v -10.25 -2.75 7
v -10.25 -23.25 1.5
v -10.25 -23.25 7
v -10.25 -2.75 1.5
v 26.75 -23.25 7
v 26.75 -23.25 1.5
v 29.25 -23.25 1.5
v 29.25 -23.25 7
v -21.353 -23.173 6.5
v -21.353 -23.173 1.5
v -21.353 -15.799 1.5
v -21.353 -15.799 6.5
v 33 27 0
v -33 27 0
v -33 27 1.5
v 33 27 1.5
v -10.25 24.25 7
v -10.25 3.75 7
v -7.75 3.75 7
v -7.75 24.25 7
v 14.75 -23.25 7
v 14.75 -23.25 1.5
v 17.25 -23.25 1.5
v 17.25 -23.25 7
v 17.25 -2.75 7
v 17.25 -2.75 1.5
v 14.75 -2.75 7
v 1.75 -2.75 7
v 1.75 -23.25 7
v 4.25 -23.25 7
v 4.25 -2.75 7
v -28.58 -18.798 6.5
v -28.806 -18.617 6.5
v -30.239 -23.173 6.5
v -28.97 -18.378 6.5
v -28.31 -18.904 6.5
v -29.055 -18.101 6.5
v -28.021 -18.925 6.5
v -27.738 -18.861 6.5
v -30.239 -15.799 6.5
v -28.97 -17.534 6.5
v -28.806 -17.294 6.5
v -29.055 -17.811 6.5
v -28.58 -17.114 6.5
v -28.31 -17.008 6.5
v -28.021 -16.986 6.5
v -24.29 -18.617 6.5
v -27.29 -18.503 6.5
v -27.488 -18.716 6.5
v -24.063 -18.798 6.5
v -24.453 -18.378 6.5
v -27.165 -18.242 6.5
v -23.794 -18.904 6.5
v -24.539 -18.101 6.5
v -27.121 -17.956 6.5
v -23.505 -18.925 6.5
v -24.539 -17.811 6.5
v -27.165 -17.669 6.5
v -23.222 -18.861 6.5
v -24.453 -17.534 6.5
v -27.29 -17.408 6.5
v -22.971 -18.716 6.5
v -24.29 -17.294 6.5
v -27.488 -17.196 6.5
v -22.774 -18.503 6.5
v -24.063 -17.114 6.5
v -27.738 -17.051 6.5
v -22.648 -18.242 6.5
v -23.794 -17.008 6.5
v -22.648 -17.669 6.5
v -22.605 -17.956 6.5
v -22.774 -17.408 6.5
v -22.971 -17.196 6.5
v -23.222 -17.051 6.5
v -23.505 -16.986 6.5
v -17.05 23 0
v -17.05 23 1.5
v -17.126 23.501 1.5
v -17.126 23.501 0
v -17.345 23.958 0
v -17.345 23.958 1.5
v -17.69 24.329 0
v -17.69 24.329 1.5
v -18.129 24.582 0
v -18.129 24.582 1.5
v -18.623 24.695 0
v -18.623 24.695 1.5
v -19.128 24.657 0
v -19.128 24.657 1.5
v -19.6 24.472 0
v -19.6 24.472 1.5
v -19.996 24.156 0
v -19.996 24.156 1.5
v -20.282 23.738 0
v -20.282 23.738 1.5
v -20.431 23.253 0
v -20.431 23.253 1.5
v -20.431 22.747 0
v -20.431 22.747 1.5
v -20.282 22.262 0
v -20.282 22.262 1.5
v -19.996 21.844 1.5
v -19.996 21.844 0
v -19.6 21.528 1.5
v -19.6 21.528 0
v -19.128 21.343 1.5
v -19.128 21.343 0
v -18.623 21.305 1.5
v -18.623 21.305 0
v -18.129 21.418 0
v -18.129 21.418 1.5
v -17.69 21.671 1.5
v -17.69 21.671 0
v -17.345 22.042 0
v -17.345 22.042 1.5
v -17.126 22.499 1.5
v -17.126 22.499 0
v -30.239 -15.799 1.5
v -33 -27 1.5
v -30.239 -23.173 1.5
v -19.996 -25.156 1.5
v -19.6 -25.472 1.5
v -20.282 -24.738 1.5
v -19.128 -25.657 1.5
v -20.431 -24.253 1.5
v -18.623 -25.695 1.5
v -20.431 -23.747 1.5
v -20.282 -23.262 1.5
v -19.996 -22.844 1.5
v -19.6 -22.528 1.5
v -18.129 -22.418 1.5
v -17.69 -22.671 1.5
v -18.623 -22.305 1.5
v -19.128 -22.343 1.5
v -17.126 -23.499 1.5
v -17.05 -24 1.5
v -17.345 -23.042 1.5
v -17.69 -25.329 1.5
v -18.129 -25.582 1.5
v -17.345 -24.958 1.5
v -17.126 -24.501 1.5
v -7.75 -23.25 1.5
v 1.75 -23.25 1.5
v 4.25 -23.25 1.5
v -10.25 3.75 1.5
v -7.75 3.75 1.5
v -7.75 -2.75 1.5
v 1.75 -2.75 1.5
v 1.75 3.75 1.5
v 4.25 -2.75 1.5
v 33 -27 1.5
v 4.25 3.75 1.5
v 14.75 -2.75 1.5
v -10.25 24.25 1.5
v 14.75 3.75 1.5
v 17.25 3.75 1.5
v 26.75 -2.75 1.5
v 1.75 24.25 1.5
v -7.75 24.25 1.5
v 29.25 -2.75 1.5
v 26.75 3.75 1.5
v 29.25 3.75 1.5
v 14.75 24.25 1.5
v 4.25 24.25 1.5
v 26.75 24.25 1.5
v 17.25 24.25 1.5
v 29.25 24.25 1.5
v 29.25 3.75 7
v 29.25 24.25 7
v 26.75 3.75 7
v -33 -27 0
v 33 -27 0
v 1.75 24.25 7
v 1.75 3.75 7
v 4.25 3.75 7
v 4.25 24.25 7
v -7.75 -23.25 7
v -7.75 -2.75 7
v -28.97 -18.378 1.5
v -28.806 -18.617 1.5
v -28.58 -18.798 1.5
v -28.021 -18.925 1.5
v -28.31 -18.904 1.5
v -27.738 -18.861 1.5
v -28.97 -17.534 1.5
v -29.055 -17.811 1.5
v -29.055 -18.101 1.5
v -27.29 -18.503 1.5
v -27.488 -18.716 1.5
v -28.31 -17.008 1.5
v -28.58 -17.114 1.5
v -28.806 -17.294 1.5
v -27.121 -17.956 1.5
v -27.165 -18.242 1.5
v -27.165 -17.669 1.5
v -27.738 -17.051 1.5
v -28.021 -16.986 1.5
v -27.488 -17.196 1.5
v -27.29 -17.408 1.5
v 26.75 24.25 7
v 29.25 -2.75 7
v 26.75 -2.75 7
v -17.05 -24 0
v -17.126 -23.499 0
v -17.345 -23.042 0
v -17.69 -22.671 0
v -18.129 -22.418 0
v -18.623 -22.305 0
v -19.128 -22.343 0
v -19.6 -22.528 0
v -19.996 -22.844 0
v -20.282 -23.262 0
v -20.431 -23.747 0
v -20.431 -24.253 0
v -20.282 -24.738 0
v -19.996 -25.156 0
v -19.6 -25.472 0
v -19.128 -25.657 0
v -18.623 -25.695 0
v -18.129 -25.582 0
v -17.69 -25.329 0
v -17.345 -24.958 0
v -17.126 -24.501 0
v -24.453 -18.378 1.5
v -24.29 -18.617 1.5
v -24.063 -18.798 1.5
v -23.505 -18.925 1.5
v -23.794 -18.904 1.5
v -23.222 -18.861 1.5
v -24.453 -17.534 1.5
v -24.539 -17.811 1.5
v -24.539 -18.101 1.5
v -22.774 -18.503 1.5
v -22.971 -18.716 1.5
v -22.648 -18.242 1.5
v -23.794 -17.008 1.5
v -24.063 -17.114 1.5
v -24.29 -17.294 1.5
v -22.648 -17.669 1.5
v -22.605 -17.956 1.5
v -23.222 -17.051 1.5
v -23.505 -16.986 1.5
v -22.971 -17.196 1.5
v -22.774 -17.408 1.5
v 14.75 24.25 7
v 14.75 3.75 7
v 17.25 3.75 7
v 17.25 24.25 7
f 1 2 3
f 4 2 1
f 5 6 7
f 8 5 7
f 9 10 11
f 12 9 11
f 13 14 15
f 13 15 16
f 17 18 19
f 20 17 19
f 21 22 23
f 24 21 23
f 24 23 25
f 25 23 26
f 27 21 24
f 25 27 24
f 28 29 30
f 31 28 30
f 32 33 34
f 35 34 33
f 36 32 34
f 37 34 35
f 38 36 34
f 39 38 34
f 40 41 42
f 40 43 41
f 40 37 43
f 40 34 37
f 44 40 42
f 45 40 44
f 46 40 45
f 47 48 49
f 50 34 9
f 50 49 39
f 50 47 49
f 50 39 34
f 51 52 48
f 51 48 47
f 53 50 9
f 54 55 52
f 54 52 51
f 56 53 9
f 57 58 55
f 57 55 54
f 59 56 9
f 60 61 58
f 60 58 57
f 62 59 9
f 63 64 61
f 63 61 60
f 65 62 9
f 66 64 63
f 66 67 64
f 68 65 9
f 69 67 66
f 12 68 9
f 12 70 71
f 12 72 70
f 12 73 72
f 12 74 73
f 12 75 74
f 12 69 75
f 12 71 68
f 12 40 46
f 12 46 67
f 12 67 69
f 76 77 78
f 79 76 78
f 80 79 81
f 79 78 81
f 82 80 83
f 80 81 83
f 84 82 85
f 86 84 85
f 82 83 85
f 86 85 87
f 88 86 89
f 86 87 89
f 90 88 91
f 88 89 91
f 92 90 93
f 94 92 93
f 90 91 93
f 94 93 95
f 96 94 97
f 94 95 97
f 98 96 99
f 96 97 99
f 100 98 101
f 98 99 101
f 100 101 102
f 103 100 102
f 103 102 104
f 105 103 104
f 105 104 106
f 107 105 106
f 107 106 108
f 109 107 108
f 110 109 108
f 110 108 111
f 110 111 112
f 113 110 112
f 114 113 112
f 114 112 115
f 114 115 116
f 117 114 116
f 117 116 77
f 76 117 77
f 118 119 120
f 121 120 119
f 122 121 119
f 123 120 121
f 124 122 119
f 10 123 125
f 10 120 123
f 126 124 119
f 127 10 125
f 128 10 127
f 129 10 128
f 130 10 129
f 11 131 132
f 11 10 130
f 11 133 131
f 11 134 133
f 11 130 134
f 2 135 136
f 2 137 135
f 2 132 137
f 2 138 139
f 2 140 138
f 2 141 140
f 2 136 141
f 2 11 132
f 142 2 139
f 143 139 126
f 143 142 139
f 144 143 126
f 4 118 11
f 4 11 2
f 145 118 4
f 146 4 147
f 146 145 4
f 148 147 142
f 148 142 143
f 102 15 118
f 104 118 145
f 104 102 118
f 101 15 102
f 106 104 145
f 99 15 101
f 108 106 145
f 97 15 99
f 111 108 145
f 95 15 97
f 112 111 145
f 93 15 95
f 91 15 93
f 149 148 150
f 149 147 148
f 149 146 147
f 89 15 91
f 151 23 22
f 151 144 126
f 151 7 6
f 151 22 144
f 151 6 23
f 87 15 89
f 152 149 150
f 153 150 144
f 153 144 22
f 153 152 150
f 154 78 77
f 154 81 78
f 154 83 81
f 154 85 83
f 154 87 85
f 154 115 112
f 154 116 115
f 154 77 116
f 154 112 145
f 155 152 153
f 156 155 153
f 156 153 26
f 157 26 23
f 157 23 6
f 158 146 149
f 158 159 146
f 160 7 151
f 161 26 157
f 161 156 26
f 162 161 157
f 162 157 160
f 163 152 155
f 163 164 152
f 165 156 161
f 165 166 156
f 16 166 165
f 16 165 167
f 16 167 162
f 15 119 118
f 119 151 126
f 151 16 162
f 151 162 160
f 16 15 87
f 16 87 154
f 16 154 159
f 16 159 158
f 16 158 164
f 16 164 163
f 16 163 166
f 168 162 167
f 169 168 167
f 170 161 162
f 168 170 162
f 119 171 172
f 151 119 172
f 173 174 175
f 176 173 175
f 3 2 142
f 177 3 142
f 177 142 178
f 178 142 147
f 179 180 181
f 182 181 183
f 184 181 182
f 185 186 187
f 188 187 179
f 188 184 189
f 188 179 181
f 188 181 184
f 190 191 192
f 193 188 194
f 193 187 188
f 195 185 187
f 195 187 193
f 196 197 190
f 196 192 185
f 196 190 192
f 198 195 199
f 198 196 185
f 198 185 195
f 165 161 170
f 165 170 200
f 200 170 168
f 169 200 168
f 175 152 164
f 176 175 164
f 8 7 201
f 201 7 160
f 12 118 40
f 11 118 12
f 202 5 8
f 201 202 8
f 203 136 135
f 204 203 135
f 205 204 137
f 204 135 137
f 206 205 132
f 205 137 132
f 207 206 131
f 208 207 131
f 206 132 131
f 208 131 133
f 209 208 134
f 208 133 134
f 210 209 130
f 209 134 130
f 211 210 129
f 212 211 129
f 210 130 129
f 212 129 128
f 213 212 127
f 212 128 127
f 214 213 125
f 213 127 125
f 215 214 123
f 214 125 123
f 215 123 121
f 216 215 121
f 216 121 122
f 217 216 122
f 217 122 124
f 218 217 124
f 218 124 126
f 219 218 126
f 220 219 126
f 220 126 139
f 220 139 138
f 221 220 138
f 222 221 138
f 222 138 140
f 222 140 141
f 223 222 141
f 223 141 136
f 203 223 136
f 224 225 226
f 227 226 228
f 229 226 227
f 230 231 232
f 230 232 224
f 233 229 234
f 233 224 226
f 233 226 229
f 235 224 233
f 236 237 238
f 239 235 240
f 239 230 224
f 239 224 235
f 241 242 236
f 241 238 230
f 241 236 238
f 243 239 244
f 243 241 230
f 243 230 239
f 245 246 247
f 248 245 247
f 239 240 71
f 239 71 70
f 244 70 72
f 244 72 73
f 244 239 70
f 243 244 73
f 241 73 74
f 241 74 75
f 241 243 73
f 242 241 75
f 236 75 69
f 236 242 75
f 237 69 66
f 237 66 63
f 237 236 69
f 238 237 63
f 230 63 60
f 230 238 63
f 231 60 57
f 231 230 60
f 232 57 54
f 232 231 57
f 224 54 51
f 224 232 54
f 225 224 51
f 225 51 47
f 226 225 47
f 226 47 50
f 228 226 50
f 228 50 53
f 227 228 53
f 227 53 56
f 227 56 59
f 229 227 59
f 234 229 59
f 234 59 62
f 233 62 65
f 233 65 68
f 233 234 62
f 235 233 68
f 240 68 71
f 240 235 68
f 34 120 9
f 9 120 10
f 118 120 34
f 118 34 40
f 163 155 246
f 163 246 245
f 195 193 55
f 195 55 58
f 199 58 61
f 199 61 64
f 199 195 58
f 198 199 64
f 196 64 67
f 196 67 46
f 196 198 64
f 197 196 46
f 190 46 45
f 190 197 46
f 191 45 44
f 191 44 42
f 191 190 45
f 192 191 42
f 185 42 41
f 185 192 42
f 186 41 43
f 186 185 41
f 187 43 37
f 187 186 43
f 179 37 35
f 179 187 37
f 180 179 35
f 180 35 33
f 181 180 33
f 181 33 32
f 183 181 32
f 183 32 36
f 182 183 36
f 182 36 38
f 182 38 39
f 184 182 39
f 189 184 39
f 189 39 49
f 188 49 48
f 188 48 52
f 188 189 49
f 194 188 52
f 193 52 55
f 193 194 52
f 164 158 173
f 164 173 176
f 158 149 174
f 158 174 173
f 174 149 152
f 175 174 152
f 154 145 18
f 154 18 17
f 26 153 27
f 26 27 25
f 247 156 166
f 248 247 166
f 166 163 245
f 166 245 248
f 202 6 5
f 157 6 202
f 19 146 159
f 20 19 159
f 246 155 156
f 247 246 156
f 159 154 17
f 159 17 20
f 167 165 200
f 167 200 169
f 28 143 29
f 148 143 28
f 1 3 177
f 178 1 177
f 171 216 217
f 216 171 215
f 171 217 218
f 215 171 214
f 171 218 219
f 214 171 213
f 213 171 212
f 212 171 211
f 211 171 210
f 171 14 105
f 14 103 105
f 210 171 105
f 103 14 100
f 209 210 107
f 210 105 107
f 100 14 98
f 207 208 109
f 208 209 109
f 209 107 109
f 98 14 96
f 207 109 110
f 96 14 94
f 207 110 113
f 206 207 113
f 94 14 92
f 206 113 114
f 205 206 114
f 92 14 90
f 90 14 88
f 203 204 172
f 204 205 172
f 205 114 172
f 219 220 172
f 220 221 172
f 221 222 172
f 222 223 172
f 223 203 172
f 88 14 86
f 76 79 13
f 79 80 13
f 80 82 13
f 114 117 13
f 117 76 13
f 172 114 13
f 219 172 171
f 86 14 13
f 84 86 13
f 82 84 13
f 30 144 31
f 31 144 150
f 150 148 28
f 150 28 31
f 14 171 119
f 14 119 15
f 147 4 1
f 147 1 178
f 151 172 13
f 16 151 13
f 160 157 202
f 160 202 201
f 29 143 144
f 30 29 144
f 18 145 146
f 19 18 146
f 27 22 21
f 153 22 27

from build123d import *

# Parameters (mm, degrees)
SKETCH075_W                     = 66
SKETCH075_H                     = 54
PAD041_DEPTH                    = 1.5
SKETCH076_W                     = 2.5
SKETCH076_H                     = 20.5
PAD042_DEPTH                    = 7
SKETCH076_LINEARPATTERN002_2_W  = 2.5
SKETCH076_LINEARPATTERN002_2_H  = 20.5
PAD042_LINEARPATTERN002_2_DEPTH = 7
LINEARPATTERN003_COUNT          = 2
LINEARPATTERN003_PITCH          = 27
SKETCH077_W                     = 8.886057
SKETCH077_H                     = 7.374495
SKETCH077_R                     = 0.972187
PAD043_DEPTH                    = 5
SKETCH078_R                     = 1.7
HOLE_DEPTH                      = 25


with BuildPart() as part:
    # Sketch075 → Pad041 (new body)
    with BuildSketch(Plane.XY):
        Rectangle(SKETCH075_W, SKETCH075_H)
    extrude(amount=PAD041_DEPTH)

    # Sketch076 → Pad042 (join)
    with BuildSketch(Plane(origin=(-3, -13, 0), x_dir=(1, 0, 0), z_dir=(0, 0, 1))):
        with Locations((-6, 0)):
            Rectangle(SKETCH076_W, SKETCH076_H)
        with Locations((6, 0)):
            Rectangle(SKETCH076_W, SKETCH076_H)
    pad042 = extrude(amount=PAD042_DEPTH)

    # Sketch076 LinearPattern002 2 → Pad042 LinearPattern002 2 (add)
    with BuildSketch(Plane(origin=(22, -13, 0), x_dir=(1, 0, 0), z_dir=(0, 0, 1))):
        with Locations((-6, 0)):
            Rectangle(SKETCH076_LINEARPATTERN002_2_W, SKETCH076_LINEARPATTERN002_2_H)
        with Locations((6, 0)):
            Rectangle(SKETCH076_LINEARPATTERN002_2_W, SKETCH076_LINEARPATTERN002_2_H)
    pad042_linearpattern002_2 = extrude(amount=PAD042_LINEARPATTERN002_2_DEPTH)

    # LinearPattern003: Pad042, Pad042 LinearPattern002 2 ×2
    with Locations(*[(0, i * LINEARPATTERN003_PITCH, 0) for i in range(1, LINEARPATTERN003_COUNT)]):
        add(pad042)
        add(pad042_linearpattern002_2)

    # Sketch077 → Pad043 (join)
    with BuildSketch(Plane.XY.offset(1.5)):
        with Locations((-25.795806, -19.485859)):
            Rectangle(SKETCH077_W, SKETCH077_H)
        with Locations((-28.09366, -17.955694)):
            Circle(SKETCH077_R, mode=Mode.SUBTRACT)
        with Locations((-23.577271, -17.955694)):
            Circle(SKETCH077_R, mode=Mode.SUBTRACT)
    extrude(amount=PAD043_DEPTH)

    # Sketch078 → Hole (cut)
    with BuildSketch(Plane.XY.offset(1.5)):
        with Locations((-18.75, 23)):
            Circle(SKETCH078_R)
        with Locations((-18.75, -24)):
            Circle(SKETCH078_R)
    extrude(amount=-HOLE_DEPTH, mode=Mode.SUBTRACT)


solid = part.part
